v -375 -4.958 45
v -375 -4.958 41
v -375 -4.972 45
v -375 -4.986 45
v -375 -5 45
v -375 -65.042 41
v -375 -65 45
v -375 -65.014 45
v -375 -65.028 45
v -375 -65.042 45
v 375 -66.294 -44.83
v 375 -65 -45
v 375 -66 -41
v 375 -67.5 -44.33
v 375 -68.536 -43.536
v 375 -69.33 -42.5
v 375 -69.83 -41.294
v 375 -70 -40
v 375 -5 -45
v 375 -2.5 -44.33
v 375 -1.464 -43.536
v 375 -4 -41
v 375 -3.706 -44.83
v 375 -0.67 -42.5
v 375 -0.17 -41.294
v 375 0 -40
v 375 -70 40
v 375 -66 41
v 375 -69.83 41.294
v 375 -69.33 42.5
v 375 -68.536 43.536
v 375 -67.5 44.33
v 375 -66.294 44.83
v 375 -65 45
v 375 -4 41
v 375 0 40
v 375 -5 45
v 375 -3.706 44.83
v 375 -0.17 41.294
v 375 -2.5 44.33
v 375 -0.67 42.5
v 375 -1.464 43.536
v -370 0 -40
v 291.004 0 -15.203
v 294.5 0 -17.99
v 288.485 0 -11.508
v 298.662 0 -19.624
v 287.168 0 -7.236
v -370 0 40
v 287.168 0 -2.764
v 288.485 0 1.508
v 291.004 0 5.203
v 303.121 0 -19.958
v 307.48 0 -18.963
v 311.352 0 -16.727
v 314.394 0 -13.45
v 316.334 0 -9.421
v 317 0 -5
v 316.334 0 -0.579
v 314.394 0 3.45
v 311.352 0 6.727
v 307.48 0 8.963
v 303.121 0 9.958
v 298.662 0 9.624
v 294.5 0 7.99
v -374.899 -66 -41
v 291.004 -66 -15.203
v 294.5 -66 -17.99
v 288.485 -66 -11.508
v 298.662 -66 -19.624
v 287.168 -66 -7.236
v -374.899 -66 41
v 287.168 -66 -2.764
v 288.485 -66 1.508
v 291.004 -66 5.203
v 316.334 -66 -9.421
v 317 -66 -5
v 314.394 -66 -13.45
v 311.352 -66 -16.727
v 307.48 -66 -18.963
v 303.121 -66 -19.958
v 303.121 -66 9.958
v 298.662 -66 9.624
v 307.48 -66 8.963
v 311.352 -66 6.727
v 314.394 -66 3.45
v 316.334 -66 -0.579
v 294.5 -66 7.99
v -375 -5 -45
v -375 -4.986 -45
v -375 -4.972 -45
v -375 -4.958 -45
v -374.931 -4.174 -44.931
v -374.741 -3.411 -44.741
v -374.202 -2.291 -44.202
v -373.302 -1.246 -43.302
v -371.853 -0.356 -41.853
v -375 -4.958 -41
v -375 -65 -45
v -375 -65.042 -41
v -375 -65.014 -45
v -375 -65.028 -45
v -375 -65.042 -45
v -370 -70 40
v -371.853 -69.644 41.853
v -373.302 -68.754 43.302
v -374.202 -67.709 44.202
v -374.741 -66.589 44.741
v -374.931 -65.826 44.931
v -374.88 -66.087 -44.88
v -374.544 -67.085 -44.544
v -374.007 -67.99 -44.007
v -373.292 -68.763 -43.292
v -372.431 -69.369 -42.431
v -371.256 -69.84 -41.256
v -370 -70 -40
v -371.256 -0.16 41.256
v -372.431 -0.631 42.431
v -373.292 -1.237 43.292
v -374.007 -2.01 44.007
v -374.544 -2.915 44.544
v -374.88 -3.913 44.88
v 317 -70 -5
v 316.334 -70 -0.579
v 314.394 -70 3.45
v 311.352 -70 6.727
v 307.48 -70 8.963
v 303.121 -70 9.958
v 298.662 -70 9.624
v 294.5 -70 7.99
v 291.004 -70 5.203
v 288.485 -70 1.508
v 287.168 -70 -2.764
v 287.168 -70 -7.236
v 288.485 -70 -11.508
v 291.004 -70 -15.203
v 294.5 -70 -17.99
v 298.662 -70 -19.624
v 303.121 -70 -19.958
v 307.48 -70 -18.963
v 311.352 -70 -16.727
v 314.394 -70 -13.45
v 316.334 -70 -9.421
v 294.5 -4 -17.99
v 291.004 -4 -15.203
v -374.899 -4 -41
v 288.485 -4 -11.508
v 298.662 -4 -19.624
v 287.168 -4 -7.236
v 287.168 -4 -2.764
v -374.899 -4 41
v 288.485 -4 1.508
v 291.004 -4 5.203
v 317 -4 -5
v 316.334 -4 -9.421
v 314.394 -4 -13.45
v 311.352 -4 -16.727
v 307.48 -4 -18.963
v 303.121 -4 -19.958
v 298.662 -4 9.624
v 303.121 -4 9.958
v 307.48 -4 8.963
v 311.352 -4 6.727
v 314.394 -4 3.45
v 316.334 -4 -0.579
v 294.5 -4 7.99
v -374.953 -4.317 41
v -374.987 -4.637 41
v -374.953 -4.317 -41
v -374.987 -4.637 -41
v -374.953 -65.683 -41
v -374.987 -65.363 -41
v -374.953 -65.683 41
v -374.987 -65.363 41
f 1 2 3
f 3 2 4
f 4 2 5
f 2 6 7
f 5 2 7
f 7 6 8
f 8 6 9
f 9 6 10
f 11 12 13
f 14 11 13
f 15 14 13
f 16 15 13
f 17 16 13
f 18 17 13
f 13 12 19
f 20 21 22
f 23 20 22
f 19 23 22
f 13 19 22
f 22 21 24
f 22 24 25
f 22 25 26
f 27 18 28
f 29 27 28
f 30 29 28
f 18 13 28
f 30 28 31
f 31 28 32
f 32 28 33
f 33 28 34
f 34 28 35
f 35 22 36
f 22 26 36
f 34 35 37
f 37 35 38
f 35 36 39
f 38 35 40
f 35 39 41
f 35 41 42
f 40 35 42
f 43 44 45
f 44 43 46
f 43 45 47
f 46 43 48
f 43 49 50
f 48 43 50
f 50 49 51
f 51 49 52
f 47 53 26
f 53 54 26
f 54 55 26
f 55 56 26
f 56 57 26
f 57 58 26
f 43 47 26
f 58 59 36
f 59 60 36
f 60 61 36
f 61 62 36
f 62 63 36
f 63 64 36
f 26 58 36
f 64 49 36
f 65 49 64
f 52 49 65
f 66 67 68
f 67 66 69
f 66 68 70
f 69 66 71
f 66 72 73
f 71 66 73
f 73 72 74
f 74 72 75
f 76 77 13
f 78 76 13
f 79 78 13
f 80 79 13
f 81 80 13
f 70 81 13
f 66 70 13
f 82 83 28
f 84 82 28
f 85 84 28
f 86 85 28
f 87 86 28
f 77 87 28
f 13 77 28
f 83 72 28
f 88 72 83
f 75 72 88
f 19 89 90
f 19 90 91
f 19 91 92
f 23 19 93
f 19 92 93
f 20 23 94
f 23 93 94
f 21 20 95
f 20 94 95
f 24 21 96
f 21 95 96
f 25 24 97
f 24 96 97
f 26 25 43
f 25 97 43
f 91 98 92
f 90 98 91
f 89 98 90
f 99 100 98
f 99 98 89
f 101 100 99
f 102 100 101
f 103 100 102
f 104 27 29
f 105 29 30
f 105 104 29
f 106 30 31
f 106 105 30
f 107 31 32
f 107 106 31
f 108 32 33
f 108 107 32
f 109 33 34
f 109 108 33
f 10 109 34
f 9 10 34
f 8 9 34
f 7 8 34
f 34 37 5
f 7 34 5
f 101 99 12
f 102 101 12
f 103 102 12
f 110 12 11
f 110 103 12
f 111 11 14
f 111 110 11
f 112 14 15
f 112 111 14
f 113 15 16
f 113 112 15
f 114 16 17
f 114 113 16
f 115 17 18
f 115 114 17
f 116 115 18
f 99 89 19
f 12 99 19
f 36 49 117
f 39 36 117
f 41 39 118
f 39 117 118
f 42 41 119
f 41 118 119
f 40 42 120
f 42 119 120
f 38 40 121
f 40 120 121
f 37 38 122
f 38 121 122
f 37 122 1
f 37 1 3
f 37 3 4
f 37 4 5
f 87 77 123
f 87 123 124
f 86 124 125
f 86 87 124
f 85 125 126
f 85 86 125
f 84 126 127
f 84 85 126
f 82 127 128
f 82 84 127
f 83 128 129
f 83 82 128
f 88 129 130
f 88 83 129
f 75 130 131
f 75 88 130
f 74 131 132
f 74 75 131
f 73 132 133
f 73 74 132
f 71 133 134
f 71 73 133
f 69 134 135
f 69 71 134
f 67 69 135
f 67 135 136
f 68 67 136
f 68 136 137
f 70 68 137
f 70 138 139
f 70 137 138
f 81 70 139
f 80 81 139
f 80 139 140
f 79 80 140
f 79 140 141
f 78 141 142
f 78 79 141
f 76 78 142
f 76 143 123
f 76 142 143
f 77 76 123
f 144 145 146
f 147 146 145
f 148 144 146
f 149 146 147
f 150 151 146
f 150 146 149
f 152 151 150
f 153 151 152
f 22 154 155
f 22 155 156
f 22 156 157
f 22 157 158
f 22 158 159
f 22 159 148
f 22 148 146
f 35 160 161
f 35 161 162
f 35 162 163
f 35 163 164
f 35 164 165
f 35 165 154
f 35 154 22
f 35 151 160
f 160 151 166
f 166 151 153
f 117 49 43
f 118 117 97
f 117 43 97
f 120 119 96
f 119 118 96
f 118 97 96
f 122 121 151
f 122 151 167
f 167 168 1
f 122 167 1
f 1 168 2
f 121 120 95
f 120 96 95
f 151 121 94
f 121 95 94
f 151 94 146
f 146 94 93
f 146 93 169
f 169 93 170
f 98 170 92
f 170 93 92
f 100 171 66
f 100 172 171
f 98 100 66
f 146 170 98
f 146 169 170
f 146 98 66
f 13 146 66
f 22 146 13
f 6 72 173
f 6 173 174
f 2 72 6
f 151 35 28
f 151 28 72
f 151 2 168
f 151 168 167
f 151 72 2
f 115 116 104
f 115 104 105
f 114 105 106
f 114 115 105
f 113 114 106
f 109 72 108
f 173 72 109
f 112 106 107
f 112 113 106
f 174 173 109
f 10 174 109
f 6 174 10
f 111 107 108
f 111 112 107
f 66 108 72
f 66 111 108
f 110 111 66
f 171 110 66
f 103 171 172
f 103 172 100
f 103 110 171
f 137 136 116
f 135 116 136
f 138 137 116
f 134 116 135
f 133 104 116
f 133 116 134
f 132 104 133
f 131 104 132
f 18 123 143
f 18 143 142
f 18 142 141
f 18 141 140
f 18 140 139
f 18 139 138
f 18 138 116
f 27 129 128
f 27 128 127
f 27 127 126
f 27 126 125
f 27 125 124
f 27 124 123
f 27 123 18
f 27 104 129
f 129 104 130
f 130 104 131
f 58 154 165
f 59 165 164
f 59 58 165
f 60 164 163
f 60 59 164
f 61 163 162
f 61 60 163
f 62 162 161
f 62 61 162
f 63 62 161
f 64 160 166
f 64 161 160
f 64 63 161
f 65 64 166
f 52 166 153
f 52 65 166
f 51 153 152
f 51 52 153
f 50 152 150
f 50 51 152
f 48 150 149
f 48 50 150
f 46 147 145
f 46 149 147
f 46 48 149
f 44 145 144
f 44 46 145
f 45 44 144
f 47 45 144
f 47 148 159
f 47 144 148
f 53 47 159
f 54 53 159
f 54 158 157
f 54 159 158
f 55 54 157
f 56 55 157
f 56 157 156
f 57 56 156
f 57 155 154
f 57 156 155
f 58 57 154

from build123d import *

# Parameters (mm, degrees)
F1_DEPTH     = 70
F2_T         = 4
F3_T1_DEPTH  = 774.9998275448
F3_T3_DEPTH  = 114.9996550895
F3_T6_ANGLE  = 90.0000000944
F3_T8_ANGLE  = 89.9999999363
F3_T10_ANGLE = 90.0000000944
F3_T12_ANGLE = 89.9999999363
F4_R         = 15
F5_DEPTH     = 70.001


# Not quite as in the source:
# - a fillet or chamfer that OpenCascade refuses, or shapes differently, is made with other operations: its cross-section is extruded or revolved along the edge and cut away or added
# - a shell that OpenCascade refuses in one call is made with other operations: the cavity is built on its own and cut out


with BuildPart() as f1:
    # F0 (on Front) → F1 (new body)
    with BuildSketch(Plane.XZ):
        with BuildLine():
            Line((-374.9998275448, -45), (375, -45))
            Line((375, -45), (375, 45))
            Line((375, 45), (-374.9998275448, 45))
            ThreePointArc((-374.9998275448, 45), (-374.999949489, 44.999949489), (-375, 44.9998275448))
            Line((-375, 44.9998275448), (-375, -44.9998275448))
            ThreePointArc((-375, -44.9998275448), (-374.999949489, -44.999949489), (-374.9998275448, -45))
        make_face()
    extrude(amount=F1_DEPTH)

    # F2: shell of thickness 4, made by hand


with BuildPart() as f2_core1:
    # F2_t2: copy of F1
    add(f1.part)

    # the walls: a layer under each face that stays
    f2_faces = [f2_core1.faces().sort_by_distance(p)[0] for p in [
        (8.62276e-05, -35, -45),
        (8.62276e-05, -35, 45),
        (0, 0, 0),
        (0, -70, 0),
    ]]
    thicken(f2_faces, amount=-F2_T, mode=Mode.SUBTRACT)


with BuildPart() as f1_1:
    add(f1.part)

    # what is left inside the walls is the cavity
    f2_cavity = [f2_core1.part.solids().sort_by_distance(p)[0] for p in [
        (0, -4.04, -15),
    ]]
    add(f2_cavity, mode=Mode.SUBTRACT)

    # F3: fillet of radius 5 on 4 edges, made by hand

    # F3_s2 → F3_t1 (cut)
    with BuildSketch(Plane.YZ.offset(-387.4998275448)):
        with BuildLine():
            ThreePointArc((-70, 40), (-68.5355339059, 43.5355339059), (-65, 45))
            Line((-65, 45), (-70, 45))
            Line((-70, 45), (-70, 40))
        make_face()
        with BuildLine():
            ThreePointArc((0, 40), (-1.4644660941, 43.5355339059), (-5, 45))
            Line((-5, 45), (0, 45))
            Line((0, 45), (0, 40))
        make_face()
        with BuildLine():
            ThreePointArc((-5, -45), (-1.4644660941, -43.5355339059), (0, -40))
            Line((0, -40), (0, -45))
            Line((0, -45), (-5, -45))
        make_face()
        with BuildLine():
            ThreePointArc((-65, -45), (-68.5355339059, -43.5355339059), (-70, -40))
            Line((-70, -40), (-70, -45))
            Line((-70, -45), (-65, -45))
        make_face()
    extrude(amount=F3_T1_DEPTH, mode=Mode.SUBTRACT)

    # F3_s4 → F3_t3 (cut)
    with BuildSketch(Plane.XY.offset(-57.4998275448)):
        with BuildLine():
            ThreePointArc((-370, -70), (-373.5355339059, -68.5355339059), (-375, -65))
            Line((-375, -65), (-375, -70))
            Line((-375, -70), (-370, -70))
        make_face()
        with BuildLine():
            ThreePointArc((-370, 0), (-373.5355339059, -1.4644660941), (-375, -5))
            Line((-375, -5), (-375, 0))
            Line((-375, 0), (-370, 0))
        make_face()
    extrude(amount=F3_T3_DEPTH, mode=Mode.SUBTRACT)

    # F3_s5 → F3_t6 (revolve, cut)
    with BuildSketch(Plane.XY.offset(-44.9998275448)):
        with BuildLine():
            ThreePointArc((-375, -65), (-374.999956886, -65.0207638646), (-374.9998275448, -65.0415273711))
            Line((-374.9998275448, -65.0415273711), (-374.9998275448, -70))
            Line((-374.9998275448, -70), (-375, -70))
            Line((-375, -70), (-375, -65))
        make_face()
    revolve(axis=Axis((-374.9998275448, -70, -44.9998275448), (0, -1, 0)), revolution_arc=F3_T6_ANGLE, mode=Mode.SUBTRACT)

    # F3_s7 → F3_t8 (revolve, cut)
    with BuildSketch(Plane.YZ.offset(-374.9998275448)):
        with BuildLine():
            ThreePointArc((-65.0415273711, 44.9998275448), (-65.0207638646, 44.999956886), (-65, 45))
            Line((-65, 45), (-70, 45))
            Line((-70, 45), (-70, 44.9998275448))
            Line((-70, 44.9998275448), (-65.0415273711, 44.9998275448))
        make_face()
    revolve(axis=Axis((-374.9998275448, -70, 44.9998275448), (0, -1, 0)), revolution_arc=F3_T8_ANGLE, mode=Mode.SUBTRACT)

    # F3_s9 → F3_t10 (revolve, cut)
    with BuildSketch(Plane.XY.offset(-44.9998275448)):
        with BuildLine():
            ThreePointArc((-375, -5), (-374.999956886, -4.9792361354), (-374.9998275448, -4.9584726289))
            Line((-374.9998275448, -4.9584726289), (-374.9998275448, 0))
            Line((-374.9998275448, 0), (-375, 0))
            Line((-375, 0), (-375, -5))
        make_face()
    revolve(axis=Axis((-374.9998275448, 0, -44.9998275448), (0, -1, 0)), revolution_arc=F3_T10_ANGLE, mode=Mode.SUBTRACT)

    # F3_s11 → F3_t12 (revolve, cut)
    with BuildSketch(Plane.YZ.offset(-374.9998275448)):
        with BuildLine():
            ThreePointArc((-4.9584726289, 44.9998275448), (-4.9792361354, 44.999956886), (-5, 45))
            Line((-5, 45), (0, 45))
            Line((0, 45), (0, 44.9998275448))
            Line((0, 44.9998275448), (-4.9584726289, 44.9998275448))
        make_face()
    revolve(axis=Axis((-374.9998275448, 0, 44.9998275448), (0, -1, 0)), revolution_arc=F3_T12_ANGLE, mode=Mode.SUBTRACT)

    # F4 (on Front) → F5 (cut, through all)
    with BuildSketch(Plane.XZ):
        with Locations((302, -5)):
            Circle(F4_R)
    extrude(amount=F5_DEPTH, mode=Mode.SUBTRACT)


solid = f1_1.part
